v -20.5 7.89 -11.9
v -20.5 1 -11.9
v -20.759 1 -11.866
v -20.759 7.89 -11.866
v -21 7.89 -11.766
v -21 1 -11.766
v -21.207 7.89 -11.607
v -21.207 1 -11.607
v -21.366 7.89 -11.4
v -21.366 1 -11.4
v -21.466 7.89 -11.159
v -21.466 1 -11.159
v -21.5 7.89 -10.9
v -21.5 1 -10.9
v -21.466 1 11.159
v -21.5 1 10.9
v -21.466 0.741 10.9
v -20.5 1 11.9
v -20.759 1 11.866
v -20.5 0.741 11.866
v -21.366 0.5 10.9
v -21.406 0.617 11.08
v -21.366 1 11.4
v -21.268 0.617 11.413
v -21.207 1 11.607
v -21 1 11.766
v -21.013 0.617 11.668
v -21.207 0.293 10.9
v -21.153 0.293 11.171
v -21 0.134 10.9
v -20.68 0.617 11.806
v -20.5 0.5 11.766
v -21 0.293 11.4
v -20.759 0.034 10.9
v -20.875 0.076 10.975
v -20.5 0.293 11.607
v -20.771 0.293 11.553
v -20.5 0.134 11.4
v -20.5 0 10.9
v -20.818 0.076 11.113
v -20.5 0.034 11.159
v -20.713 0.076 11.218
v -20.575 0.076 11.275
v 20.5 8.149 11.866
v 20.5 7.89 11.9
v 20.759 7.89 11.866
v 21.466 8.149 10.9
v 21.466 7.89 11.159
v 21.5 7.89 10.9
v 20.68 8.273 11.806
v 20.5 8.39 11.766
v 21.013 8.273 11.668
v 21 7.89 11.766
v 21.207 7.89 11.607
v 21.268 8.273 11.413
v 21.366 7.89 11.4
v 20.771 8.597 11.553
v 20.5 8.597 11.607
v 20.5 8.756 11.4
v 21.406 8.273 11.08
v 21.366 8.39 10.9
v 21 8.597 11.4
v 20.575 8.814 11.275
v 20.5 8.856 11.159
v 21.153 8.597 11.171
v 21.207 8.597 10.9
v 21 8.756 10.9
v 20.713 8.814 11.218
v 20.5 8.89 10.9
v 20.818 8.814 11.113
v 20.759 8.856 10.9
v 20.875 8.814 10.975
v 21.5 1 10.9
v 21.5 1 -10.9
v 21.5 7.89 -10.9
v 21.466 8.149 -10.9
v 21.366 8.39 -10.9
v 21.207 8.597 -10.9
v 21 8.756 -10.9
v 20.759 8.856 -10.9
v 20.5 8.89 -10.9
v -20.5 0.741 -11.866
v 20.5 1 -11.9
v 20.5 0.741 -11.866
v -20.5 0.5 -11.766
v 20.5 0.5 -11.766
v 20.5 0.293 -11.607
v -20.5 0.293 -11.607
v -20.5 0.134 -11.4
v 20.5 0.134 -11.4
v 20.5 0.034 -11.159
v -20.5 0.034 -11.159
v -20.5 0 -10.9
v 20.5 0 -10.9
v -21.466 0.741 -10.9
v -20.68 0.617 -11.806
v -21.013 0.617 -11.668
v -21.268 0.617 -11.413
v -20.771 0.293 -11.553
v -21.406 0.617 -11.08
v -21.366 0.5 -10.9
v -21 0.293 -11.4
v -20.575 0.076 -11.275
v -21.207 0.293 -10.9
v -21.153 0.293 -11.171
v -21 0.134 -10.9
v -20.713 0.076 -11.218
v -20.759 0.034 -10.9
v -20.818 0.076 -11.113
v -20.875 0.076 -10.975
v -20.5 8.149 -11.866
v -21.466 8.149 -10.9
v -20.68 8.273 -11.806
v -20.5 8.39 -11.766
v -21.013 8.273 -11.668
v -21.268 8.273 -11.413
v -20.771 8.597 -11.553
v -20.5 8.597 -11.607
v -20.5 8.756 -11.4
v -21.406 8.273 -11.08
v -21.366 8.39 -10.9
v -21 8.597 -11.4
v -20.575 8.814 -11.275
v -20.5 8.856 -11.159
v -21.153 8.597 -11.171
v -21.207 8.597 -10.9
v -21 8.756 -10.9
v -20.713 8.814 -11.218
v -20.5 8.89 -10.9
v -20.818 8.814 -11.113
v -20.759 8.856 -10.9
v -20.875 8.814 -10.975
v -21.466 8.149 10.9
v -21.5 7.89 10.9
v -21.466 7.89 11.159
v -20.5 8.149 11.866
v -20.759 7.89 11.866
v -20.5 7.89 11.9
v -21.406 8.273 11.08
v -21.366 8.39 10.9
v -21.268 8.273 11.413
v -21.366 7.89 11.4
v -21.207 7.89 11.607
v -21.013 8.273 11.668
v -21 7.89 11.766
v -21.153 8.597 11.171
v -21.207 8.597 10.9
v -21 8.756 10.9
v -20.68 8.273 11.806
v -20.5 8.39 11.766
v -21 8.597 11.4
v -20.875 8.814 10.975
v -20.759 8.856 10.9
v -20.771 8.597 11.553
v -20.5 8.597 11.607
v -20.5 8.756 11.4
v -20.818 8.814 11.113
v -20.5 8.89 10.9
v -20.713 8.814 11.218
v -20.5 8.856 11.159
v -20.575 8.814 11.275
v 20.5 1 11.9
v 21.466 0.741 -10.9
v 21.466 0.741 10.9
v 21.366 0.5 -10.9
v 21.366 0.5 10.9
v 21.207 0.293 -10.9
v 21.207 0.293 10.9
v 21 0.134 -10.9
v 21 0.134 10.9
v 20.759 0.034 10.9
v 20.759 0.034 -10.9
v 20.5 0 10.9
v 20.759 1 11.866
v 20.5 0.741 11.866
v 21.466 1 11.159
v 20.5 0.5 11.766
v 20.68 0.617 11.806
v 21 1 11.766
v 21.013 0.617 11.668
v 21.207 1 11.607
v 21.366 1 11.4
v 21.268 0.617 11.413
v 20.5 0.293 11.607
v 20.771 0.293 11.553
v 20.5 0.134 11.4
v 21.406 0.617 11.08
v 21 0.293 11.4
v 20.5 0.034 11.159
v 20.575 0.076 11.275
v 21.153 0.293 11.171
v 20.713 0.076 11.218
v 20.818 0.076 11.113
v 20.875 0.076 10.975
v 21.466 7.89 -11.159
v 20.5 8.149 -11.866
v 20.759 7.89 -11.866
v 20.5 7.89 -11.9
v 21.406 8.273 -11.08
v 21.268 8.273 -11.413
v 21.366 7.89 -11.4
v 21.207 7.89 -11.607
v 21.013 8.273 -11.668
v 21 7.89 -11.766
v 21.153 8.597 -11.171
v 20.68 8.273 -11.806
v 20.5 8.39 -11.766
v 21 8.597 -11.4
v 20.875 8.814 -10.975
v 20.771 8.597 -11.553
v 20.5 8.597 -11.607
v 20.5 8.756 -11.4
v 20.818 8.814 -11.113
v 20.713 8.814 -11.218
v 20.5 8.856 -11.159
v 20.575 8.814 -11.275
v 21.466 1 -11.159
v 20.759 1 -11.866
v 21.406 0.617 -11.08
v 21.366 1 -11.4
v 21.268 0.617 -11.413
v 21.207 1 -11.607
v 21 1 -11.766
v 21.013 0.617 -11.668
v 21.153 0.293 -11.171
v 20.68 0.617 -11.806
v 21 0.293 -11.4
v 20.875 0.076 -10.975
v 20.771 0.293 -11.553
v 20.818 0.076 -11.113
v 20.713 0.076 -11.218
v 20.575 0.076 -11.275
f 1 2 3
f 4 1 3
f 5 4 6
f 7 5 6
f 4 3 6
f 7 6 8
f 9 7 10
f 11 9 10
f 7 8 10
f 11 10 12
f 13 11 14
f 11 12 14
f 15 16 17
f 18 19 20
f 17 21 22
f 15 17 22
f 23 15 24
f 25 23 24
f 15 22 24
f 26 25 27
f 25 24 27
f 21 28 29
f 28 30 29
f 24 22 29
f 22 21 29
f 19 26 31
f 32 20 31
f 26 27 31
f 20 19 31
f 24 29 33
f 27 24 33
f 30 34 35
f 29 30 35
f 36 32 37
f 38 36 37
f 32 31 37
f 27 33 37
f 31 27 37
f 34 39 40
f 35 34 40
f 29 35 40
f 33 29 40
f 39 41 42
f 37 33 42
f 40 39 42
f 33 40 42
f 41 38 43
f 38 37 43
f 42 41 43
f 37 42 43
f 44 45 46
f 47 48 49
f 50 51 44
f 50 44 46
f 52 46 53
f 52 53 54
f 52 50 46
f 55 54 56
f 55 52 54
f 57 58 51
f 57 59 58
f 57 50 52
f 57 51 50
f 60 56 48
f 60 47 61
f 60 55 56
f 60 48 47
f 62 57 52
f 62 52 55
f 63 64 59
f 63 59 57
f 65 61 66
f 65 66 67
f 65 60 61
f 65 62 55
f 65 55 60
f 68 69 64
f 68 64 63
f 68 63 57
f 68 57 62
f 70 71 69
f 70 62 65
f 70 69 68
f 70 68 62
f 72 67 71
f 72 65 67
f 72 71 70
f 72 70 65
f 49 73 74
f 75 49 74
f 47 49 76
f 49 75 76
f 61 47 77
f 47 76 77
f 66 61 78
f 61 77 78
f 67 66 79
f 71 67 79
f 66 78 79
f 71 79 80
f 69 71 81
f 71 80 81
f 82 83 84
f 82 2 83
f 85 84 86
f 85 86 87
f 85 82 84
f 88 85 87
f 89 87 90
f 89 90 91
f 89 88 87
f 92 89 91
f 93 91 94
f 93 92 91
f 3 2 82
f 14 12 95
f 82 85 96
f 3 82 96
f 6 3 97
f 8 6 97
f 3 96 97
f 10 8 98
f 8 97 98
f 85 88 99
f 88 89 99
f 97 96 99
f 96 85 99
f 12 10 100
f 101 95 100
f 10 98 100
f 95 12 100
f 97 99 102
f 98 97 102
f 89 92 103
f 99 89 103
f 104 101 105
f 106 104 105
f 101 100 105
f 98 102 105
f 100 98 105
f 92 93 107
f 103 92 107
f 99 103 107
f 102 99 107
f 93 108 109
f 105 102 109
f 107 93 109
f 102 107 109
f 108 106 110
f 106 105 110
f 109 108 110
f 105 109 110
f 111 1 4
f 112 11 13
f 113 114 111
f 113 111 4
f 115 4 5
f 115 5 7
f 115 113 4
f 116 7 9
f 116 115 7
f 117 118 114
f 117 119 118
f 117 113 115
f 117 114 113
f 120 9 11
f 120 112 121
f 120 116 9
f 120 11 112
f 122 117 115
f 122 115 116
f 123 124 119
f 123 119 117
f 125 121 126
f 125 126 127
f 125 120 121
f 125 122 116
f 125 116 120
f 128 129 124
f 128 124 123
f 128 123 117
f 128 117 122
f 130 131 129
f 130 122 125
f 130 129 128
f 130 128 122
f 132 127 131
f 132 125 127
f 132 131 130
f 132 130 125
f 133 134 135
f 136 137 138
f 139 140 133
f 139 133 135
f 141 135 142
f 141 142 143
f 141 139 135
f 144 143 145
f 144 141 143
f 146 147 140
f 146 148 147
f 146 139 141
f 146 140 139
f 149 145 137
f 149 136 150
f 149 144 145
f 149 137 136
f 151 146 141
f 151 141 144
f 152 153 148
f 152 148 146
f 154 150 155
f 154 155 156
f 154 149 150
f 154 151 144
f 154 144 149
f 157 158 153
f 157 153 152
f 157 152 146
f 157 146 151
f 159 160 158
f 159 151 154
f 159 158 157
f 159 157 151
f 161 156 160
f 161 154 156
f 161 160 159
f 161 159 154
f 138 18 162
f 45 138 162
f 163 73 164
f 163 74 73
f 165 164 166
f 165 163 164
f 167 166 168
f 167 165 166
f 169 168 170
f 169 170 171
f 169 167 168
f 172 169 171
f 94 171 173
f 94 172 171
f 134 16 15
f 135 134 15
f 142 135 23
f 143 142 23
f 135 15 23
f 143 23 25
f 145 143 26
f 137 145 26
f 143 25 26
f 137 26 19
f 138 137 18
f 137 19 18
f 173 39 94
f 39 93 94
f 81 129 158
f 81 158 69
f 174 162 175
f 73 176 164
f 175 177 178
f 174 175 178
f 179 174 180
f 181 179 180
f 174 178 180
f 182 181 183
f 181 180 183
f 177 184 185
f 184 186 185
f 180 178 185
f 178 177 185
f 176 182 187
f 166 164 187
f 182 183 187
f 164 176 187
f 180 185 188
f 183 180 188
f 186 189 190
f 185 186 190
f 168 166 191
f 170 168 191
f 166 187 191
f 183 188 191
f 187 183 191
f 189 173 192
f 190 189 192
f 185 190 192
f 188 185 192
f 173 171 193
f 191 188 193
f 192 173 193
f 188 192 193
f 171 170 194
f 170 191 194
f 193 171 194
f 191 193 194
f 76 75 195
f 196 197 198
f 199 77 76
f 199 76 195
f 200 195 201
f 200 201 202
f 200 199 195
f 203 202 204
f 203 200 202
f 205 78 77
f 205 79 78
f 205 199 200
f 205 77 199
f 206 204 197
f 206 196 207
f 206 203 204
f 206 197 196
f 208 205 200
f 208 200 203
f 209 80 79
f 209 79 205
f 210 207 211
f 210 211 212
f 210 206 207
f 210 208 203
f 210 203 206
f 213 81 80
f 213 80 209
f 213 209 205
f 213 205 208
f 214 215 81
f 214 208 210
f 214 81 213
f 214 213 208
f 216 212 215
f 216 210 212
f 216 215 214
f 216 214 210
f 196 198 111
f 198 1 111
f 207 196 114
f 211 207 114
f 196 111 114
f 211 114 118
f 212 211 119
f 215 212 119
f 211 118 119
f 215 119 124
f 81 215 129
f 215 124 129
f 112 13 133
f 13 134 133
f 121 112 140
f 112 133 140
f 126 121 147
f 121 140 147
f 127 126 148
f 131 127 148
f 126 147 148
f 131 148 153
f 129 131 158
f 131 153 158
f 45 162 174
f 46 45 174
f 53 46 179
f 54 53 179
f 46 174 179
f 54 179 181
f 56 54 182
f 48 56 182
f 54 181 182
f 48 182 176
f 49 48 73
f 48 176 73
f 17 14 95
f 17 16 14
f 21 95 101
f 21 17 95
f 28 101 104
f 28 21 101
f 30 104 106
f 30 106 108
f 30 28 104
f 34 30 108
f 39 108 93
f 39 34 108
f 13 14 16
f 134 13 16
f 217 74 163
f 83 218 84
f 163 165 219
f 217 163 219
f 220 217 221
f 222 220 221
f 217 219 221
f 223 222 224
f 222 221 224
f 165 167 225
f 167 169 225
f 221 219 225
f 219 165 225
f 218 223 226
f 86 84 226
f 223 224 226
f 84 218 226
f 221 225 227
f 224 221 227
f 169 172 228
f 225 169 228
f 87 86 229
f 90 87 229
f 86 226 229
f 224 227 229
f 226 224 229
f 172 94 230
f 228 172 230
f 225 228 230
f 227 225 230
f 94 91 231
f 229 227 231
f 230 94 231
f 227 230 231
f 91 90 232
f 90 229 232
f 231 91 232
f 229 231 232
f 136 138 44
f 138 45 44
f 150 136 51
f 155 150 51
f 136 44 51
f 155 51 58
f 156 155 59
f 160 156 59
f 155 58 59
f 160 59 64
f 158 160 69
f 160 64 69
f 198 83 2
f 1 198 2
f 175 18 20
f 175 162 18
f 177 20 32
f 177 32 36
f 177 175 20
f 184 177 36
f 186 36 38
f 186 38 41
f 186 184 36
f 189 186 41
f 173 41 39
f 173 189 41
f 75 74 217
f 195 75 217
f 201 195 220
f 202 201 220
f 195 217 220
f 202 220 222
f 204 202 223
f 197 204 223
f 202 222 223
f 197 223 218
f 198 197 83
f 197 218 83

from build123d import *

# Parameters (mm, degrees)
BOSS_EXTRUDE1_DEPTH = 8.89
FILLET1_R           = 1


with BuildPart() as part:
    # Sketch1 → Boss-Extrude1 (new body)
    with BuildSketch(Plane(origin=(0, 0, 0), x_dir=(1, 0, 0), z_dir=(0, 1, 0))):
        with BuildLine():
            Line((-20.5, -11.9), (20.5, -11.9))
            ThreePointArc((20.5, -11.9), (21.207106781, -11.607106781), (21.5, -10.9))
            Line((21.5, -10.9), (21.5, 10.9))
            ThreePointArc((21.5, 10.9), (21.207106781, 11.607106781), (20.5, 11.9))
            Line((20.5, 11.9), (-20.5, 11.9))
            ThreePointArc((-20.5, 11.9), (-21.207106781, 11.607106781), (-21.5, 10.9))
            Line((-21.5, 10.9), (-21.5, -10.9))
            ThreePointArc((-21.5, -10.9), (-21.207106781, -11.607106781), (-20.5, -11.9))
        make_face()
    extrude(amount=BOSS_EXTRUDE1_DEPTH)

    # Fillet1
    fillet1_edges = [part.edges().sort_by_distance(p)[0] for p in [
        (21.207106781, 8.89, 11.607106781),
        (0, 0, 11.9),
        (-21.207106781, 0, 11.607106781),
        (21.5, 8.89, 0),
        (21.207106781, 8.89, -11.607106781),
        (0, 8.89, -11.9),
        (-21.207106781, 8.89, -11.607106781),
        (-21.5, 8.89, 0),
        (-21.207106781, 8.89, 11.607106781),
        (0, 8.89, 11.9),
        (-21.5, 0, 0),
        (-21.207106781, 0, -11.607106781),
        (0, 0, -11.9),
        (21.207106781, 0, -11.607106781),
        (21.5, 0, 0),
        (21.207106781, 0, 11.607106781),
    ]]
    fillet(fillet1_edges, radius=FILLET1_R)


solid = part.part
